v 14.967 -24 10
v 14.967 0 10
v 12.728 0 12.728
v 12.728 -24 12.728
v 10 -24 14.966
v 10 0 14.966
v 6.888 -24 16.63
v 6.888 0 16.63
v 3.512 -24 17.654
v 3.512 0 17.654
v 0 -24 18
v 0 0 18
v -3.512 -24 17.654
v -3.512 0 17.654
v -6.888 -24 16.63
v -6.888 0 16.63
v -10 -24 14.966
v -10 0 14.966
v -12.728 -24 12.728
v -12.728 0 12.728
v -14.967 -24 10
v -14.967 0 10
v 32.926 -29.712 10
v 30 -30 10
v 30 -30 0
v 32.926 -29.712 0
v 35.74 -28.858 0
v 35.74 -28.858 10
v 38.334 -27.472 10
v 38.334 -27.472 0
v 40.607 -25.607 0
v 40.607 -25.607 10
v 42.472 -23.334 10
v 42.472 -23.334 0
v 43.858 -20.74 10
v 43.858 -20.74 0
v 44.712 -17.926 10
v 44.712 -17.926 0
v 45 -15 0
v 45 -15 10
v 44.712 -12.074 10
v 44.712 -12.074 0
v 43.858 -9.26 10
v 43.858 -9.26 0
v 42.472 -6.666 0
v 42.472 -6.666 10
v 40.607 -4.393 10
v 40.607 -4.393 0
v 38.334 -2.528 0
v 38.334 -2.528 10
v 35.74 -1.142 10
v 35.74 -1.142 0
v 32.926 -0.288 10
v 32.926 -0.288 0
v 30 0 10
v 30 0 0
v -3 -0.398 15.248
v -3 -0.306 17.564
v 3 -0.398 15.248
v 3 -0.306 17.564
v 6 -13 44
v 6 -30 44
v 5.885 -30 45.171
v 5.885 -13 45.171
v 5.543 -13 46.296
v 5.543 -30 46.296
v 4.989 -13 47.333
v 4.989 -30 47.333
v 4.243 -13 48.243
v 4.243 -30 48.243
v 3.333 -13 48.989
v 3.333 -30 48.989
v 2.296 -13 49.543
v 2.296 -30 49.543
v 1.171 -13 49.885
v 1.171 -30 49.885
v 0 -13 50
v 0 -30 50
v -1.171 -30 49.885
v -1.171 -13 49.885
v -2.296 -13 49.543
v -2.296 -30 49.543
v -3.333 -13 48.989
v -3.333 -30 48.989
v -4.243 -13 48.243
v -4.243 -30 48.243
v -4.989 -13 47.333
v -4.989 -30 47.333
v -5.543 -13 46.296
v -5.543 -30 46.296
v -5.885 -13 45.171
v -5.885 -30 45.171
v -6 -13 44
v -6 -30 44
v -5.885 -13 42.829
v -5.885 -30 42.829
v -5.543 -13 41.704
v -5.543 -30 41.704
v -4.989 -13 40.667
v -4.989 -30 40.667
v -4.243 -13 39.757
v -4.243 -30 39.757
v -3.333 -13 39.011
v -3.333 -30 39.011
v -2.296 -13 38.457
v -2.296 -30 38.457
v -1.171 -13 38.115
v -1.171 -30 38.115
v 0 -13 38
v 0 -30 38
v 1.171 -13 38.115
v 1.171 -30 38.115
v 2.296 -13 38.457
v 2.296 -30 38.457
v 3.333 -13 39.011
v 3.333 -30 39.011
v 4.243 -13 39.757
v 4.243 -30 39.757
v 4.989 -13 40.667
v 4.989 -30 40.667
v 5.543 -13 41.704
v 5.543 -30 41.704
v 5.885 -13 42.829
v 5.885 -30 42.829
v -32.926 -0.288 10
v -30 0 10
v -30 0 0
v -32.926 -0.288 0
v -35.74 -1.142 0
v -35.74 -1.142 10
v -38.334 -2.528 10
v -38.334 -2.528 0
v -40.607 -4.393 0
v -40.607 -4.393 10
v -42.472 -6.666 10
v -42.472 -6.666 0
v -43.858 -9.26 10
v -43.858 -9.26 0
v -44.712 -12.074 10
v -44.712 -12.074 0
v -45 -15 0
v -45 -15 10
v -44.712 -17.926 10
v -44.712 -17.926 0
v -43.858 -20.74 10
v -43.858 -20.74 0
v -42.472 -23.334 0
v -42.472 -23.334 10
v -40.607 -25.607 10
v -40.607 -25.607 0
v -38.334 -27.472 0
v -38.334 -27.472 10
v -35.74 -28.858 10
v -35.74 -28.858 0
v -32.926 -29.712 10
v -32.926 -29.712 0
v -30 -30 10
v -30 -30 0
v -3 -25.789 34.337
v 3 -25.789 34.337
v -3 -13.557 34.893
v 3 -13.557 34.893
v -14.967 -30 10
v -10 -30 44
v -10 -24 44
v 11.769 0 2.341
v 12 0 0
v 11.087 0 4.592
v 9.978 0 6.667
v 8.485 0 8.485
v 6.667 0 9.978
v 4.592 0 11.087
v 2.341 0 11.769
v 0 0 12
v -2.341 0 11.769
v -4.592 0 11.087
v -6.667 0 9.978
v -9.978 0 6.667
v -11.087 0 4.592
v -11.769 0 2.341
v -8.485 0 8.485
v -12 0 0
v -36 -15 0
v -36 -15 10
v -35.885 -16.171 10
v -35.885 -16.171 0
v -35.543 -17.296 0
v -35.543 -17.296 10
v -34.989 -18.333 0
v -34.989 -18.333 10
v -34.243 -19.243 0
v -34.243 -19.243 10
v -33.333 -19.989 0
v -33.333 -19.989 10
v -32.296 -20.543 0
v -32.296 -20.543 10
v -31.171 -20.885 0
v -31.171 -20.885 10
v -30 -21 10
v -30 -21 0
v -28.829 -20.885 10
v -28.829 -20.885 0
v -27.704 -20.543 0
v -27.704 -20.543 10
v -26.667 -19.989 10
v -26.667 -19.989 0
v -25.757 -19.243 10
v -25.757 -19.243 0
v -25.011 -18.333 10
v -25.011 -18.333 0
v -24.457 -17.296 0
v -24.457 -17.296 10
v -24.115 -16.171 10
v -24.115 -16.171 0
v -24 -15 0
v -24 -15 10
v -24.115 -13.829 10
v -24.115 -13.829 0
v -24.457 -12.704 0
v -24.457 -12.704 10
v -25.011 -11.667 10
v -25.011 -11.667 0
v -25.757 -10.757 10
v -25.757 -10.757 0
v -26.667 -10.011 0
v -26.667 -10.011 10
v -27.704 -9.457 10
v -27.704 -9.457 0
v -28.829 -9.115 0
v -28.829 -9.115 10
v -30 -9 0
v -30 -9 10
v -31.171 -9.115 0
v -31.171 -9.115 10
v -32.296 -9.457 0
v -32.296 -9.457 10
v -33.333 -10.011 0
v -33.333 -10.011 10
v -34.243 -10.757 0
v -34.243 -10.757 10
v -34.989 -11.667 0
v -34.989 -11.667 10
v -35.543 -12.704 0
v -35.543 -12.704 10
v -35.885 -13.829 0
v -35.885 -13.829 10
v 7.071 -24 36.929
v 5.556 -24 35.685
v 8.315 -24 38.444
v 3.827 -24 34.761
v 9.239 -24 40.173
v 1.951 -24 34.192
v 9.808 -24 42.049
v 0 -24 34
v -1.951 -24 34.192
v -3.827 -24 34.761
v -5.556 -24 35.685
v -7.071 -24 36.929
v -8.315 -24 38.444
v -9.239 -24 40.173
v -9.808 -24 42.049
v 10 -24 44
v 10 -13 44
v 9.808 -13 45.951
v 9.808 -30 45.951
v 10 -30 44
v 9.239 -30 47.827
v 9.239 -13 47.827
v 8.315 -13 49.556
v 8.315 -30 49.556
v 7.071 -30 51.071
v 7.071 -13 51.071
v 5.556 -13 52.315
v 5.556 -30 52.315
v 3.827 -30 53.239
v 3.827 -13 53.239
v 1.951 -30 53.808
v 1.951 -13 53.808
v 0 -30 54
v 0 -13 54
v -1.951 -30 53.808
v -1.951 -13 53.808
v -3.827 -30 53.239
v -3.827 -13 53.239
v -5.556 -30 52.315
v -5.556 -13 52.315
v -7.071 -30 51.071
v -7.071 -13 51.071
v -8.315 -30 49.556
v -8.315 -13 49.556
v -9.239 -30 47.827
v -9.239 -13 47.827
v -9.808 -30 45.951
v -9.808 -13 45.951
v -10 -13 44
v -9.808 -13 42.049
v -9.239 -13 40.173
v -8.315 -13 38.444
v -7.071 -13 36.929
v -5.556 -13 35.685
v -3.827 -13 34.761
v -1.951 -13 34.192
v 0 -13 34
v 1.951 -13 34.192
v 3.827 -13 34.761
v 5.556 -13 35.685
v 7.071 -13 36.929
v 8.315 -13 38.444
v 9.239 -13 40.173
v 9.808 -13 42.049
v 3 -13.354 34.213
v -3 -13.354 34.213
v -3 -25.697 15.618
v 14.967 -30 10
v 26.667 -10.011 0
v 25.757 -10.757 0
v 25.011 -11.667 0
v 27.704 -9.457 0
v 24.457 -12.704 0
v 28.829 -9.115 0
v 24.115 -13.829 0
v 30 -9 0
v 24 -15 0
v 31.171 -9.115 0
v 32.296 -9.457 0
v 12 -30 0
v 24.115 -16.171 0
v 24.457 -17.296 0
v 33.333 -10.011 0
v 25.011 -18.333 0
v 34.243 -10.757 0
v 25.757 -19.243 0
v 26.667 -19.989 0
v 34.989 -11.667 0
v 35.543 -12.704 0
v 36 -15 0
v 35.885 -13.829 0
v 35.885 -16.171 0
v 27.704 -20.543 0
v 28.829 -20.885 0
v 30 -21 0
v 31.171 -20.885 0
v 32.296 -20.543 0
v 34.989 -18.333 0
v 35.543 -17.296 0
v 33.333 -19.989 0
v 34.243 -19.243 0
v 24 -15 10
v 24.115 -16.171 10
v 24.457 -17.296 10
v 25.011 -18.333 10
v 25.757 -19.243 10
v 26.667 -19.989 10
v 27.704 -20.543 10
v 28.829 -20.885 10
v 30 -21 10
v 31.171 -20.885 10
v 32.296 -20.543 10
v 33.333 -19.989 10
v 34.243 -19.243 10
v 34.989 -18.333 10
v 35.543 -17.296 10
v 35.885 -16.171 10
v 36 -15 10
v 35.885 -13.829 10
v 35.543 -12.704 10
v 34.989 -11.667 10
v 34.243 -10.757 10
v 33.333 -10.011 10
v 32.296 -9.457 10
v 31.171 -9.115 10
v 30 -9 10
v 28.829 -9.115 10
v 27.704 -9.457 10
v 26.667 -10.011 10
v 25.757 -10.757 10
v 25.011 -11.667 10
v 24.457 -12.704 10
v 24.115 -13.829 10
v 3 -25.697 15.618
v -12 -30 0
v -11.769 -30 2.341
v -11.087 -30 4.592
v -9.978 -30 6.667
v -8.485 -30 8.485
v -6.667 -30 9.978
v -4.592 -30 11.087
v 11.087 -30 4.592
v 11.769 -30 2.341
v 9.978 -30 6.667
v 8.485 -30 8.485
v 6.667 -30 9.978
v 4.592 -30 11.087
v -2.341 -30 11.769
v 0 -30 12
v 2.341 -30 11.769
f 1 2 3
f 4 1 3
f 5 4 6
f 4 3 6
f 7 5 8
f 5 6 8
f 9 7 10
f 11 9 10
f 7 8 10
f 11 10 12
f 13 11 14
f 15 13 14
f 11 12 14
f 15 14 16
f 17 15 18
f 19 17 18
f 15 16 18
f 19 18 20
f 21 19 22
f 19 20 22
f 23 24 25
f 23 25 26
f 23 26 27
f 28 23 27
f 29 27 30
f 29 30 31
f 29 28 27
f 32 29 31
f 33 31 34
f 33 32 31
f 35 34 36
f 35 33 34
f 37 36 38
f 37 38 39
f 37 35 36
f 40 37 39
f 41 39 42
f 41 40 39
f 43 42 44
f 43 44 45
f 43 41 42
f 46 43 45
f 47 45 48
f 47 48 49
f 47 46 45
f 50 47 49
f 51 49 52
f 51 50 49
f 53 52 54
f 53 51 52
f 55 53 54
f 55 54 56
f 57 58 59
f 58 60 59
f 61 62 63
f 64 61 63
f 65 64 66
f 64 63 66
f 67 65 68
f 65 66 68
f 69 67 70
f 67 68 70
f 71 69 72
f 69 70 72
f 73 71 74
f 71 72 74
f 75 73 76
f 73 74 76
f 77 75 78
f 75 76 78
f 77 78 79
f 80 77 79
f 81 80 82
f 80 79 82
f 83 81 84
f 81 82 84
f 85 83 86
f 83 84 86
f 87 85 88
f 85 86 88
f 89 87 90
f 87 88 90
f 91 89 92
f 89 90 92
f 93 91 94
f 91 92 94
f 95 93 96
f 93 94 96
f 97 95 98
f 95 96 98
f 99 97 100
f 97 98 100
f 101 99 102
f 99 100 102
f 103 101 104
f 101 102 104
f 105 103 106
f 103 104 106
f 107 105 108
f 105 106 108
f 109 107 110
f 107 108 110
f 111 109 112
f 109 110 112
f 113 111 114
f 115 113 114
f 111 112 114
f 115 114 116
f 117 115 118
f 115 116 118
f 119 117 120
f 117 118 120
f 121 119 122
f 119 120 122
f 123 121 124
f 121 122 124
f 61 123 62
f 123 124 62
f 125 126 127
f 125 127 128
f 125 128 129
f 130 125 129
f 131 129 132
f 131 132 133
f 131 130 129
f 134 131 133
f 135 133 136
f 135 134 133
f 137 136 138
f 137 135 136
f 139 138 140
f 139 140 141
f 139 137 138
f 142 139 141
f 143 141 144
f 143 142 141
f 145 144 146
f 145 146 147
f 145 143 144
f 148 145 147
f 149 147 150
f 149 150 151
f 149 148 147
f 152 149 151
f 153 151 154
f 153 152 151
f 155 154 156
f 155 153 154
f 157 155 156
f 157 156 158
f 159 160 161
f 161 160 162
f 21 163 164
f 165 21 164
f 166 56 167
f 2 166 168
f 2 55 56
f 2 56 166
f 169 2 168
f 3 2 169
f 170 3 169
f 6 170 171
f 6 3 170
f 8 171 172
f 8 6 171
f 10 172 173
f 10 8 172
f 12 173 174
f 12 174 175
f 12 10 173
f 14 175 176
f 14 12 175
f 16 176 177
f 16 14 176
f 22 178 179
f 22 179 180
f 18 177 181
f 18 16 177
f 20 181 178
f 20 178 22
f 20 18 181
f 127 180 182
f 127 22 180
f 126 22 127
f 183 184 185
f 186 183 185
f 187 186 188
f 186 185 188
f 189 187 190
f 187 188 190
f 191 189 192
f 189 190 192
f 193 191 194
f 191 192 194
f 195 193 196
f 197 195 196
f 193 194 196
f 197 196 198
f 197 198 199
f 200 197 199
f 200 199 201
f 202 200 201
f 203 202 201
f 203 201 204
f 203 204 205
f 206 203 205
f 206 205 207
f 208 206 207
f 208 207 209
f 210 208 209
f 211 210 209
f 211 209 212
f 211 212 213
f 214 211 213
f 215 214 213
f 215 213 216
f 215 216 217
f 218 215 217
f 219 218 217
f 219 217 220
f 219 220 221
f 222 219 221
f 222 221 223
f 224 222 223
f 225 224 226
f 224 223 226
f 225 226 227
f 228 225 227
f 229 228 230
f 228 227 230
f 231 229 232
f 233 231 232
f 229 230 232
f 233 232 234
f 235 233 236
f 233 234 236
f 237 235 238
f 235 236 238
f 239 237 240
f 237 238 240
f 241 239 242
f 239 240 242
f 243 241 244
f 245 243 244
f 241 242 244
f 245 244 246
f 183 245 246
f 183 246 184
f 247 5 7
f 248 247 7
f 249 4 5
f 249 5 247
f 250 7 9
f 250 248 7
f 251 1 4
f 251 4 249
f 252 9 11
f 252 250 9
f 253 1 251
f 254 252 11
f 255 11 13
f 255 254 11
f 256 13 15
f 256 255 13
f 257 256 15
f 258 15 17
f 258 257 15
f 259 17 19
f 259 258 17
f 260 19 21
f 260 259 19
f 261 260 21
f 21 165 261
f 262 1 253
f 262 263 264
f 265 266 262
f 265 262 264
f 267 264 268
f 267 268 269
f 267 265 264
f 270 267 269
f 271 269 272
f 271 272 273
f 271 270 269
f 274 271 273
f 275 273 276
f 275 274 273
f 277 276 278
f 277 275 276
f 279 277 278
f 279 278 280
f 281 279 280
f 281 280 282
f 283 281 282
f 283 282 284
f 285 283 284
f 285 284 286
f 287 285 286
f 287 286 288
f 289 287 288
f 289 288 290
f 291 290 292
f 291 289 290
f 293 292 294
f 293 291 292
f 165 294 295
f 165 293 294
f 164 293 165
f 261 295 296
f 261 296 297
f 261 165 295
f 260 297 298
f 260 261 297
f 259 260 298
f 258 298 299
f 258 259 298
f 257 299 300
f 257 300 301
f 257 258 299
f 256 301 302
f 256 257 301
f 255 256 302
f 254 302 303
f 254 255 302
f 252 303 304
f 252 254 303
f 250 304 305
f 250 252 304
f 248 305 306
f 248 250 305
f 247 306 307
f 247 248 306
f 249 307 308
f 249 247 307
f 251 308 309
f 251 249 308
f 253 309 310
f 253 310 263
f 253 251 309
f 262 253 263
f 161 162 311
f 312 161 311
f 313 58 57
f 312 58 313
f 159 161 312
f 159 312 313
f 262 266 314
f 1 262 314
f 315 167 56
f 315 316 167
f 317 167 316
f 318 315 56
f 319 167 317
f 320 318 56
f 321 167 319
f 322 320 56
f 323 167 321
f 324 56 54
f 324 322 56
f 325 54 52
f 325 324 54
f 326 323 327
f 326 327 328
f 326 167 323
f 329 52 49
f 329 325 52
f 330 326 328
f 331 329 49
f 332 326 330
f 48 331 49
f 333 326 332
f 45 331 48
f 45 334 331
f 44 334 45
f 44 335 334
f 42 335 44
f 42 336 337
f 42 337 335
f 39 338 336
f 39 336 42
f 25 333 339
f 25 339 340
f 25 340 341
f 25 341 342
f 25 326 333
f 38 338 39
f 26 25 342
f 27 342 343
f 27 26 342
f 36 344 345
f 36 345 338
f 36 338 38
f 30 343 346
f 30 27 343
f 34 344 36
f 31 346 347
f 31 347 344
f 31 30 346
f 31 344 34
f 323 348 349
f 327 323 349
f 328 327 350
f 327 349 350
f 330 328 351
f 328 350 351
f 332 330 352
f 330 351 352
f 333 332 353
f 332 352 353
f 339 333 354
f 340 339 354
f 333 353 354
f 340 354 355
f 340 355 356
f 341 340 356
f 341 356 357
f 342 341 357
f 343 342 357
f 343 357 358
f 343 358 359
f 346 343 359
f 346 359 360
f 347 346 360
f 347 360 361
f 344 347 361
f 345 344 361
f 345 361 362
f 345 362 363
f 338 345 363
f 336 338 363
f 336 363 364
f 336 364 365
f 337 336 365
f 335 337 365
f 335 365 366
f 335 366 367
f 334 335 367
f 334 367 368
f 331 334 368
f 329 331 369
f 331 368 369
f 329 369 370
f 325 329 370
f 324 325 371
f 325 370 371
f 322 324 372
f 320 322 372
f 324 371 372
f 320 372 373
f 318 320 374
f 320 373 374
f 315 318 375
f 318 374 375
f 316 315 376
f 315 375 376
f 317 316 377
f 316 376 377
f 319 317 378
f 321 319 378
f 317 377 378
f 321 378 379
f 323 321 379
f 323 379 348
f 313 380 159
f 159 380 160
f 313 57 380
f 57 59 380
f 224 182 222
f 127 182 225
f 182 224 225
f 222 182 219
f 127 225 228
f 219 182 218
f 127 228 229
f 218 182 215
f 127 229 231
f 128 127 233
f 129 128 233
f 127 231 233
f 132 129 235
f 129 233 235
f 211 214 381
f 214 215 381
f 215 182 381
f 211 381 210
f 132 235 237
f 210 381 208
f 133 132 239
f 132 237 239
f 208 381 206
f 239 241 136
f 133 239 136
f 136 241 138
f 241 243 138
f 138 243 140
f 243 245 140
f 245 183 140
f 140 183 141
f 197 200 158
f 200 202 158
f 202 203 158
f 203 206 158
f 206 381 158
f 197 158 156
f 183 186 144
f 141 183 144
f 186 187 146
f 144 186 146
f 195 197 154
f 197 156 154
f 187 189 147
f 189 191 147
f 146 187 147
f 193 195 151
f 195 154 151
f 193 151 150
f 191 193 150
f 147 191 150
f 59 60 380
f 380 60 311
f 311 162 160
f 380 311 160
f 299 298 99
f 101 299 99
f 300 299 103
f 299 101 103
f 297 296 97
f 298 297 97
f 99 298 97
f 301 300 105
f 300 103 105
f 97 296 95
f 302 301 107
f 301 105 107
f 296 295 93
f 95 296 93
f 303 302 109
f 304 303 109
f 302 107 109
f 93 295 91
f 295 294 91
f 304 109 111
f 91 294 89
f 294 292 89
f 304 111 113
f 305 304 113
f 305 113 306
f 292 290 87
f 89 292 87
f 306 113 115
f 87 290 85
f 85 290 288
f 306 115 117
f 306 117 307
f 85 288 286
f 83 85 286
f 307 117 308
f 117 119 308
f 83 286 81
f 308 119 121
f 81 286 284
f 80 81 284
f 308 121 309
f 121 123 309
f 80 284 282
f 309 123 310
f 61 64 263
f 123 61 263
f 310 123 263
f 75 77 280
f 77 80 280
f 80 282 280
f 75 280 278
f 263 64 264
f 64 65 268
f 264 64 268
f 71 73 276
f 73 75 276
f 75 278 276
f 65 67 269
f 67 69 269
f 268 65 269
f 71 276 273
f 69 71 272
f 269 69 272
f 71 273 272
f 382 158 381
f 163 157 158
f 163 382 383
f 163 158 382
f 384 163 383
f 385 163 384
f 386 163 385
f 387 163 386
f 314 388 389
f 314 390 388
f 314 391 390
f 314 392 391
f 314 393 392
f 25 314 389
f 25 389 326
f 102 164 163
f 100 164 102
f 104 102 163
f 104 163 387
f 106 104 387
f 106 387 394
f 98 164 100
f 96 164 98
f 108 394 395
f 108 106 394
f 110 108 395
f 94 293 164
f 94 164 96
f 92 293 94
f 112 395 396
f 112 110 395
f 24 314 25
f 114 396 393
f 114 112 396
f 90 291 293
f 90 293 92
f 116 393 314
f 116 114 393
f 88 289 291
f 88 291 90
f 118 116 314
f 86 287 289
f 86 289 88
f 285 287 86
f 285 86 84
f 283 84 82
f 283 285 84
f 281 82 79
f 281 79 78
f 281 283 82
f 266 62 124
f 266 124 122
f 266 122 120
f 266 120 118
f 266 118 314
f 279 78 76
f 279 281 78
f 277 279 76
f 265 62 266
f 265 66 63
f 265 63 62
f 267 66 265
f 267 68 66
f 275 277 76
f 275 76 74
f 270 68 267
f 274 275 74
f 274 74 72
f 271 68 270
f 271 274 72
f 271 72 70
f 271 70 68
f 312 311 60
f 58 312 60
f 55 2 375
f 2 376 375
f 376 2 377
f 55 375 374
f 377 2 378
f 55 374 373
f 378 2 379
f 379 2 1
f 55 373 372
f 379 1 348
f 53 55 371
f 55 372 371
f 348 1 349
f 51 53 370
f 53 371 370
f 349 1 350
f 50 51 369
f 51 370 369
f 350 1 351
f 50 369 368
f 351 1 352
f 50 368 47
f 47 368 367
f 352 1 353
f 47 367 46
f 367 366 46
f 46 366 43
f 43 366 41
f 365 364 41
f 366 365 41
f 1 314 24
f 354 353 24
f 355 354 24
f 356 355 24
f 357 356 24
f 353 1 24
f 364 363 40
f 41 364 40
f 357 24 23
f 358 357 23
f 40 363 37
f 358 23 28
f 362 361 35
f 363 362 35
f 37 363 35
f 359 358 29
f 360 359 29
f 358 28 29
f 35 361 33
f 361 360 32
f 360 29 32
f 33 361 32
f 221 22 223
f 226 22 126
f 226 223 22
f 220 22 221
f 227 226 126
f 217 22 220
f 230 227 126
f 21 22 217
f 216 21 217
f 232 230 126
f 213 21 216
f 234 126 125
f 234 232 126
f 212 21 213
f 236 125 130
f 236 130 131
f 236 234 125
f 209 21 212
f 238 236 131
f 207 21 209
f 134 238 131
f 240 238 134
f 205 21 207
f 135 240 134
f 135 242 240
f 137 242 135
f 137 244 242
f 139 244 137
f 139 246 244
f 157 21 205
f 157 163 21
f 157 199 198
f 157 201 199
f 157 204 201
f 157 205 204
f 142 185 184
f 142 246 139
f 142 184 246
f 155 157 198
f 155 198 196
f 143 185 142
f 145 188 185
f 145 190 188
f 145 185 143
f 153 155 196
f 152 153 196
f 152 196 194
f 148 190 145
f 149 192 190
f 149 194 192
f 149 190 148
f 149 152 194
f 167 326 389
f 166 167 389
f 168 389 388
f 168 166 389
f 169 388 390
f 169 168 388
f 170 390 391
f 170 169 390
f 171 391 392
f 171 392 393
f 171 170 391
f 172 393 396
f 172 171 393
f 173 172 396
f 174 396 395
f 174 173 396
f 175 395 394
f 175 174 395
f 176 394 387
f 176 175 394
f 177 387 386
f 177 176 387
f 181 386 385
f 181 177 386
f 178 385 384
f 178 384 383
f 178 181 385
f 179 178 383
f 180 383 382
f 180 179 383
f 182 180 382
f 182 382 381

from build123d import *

# Parameters (mm, degrees)
PAD_DEPTH       = 30
PAD001_DEPTH    = 10
PAD002_DEPTH    = 10
SKETCH004_R     = 6
POCKET_DEPTH    = 10.001
SKETCH005_R     = 6
POCKET001_DEPTH = 10.001
PAD003_DEPTH    = 6
SKETCH007_R     = 10
SKETCH007_R_2   = 6
PAD004_DEPTH    = 17
SKETCH008_R     = 6
POCKET002_DEPTH = 30.001
PAD005_DEPTH    = 3


with BuildPart() as body:
    # Sketch → Pad (new body)
    with BuildSketch(Plane.XZ):
        with BuildLine():
            ThreePointArc((12, 0), (0, 12), (-12, 0))
            Line((-12, 0), (-30, 0))
            Line((-30, 10), (-30, 0))
            Line((-14.96663, 10), (-30, 10))
            ThreePointArc((14.96663, 10), (0, 18), (-14.96663, 10))
            Line((14.96663, 10), (30, 10))
            Line((30, 10), (30, 0))
            Line((12, 0), (30, 0))
        make_face()
    extrude(amount=PAD_DEPTH)

    # Sketch002 (on Face7 of Pad) → Pad001 (join)
    with BuildSketch(Plane(origin=(0, 0, 10), x_dir=(-1, 0, 0), z_dir=(0, 0, 1))):
        with BuildLine():
            Line((-30, 30), (-30, 0))
            ThreePointArc((-30, 30), (-45, 15), (-30, 0))
        make_face()
    extrude(amount=-PAD001_DEPTH)

    # Sketch003 (on Face6 of Pad001) → Pad002 (join)
    with BuildSketch(Plane(origin=(0, 0, 10), x_dir=(-1, 0, 0), z_dir=(0, 0, 1))):
        with BuildLine():
            Line((30, 30), (30, 0))
            ThreePointArc((30, 0), (45, 15), (30, 30))
        make_face()
    extrude(amount=-PAD002_DEPTH)

    # Sketch004 (on Face1 of Pad002) → Pocket (cut, through all)
    with BuildSketch(Plane(origin=(0, 0, 10), x_dir=(-1, 0, 0), z_dir=(0, 0, 1))):
        with Locations((-30, 15)):
            Circle(SKETCH004_R)
    extrude(amount=-POCKET_DEPTH, mode=Mode.SUBTRACT)

    # Sketch005 (on Face12 of Pocket) → Pocket001 (cut, through all)
    with BuildSketch(Plane(origin=(0, 0, 10), x_dir=(-1, 0, 0), z_dir=(0, 0, 1))):
        with Locations((30, 15)):
            Circle(SKETCH005_R)
    extrude(amount=-POCKET001_DEPTH, mode=Mode.SUBTRACT)

    # Sketch006 (on Face5 of Pocket001) → Pad003 (join)
    with BuildSketch(Plane.XZ.offset(30)):
        with BuildLine():
            Line((-14.96663, 10), (-10, 44))
            Line((-10, 44), (10, 44))
            Line((10, 44), (14.96663, 10))
            ThreePointArc((14.96663, 10), (0, 18), (-14.96663, 10))
        make_face()
    extrude(amount=-PAD003_DEPTH)

    # Sketch007 (on Face15 of Pad003) → Pad004 (join)
    with BuildSketch(Plane.XZ.offset(30)):
        with Locations((0, 44)):
            Circle(SKETCH007_R)
        with Locations((0, 44)):
            Circle(SKETCH007_R_2, mode=Mode.SUBTRACT)
    extrude(amount=-PAD004_DEPTH)

    # Sketch008 (on Face15 of Pad004) → Pocket002 (cut, through all)
    with BuildSketch(Plane.XZ.offset(30)):
        with Locations((0, 44)):
            Circle(SKETCH008_R)
    extrude(amount=-POCKET002_DEPTH, mode=Mode.SUBTRACT)


with BuildPart() as body001:
    # Sketch010 → Pad005 (new body, symmetric)
    with BuildSketch(Plane.YZ):
        Polygon((-13.353809, 34.213029), (-0.305546, 17.564219), (-0.398215, 15.247524), (-25.696514, 15.618195), (-25.789181, 34.337082), (-13.557035, 34.893089), align=None)
    extrude(amount=PAD005_DEPTH, both=True)


solid = Compound([body.part, body001.part])
